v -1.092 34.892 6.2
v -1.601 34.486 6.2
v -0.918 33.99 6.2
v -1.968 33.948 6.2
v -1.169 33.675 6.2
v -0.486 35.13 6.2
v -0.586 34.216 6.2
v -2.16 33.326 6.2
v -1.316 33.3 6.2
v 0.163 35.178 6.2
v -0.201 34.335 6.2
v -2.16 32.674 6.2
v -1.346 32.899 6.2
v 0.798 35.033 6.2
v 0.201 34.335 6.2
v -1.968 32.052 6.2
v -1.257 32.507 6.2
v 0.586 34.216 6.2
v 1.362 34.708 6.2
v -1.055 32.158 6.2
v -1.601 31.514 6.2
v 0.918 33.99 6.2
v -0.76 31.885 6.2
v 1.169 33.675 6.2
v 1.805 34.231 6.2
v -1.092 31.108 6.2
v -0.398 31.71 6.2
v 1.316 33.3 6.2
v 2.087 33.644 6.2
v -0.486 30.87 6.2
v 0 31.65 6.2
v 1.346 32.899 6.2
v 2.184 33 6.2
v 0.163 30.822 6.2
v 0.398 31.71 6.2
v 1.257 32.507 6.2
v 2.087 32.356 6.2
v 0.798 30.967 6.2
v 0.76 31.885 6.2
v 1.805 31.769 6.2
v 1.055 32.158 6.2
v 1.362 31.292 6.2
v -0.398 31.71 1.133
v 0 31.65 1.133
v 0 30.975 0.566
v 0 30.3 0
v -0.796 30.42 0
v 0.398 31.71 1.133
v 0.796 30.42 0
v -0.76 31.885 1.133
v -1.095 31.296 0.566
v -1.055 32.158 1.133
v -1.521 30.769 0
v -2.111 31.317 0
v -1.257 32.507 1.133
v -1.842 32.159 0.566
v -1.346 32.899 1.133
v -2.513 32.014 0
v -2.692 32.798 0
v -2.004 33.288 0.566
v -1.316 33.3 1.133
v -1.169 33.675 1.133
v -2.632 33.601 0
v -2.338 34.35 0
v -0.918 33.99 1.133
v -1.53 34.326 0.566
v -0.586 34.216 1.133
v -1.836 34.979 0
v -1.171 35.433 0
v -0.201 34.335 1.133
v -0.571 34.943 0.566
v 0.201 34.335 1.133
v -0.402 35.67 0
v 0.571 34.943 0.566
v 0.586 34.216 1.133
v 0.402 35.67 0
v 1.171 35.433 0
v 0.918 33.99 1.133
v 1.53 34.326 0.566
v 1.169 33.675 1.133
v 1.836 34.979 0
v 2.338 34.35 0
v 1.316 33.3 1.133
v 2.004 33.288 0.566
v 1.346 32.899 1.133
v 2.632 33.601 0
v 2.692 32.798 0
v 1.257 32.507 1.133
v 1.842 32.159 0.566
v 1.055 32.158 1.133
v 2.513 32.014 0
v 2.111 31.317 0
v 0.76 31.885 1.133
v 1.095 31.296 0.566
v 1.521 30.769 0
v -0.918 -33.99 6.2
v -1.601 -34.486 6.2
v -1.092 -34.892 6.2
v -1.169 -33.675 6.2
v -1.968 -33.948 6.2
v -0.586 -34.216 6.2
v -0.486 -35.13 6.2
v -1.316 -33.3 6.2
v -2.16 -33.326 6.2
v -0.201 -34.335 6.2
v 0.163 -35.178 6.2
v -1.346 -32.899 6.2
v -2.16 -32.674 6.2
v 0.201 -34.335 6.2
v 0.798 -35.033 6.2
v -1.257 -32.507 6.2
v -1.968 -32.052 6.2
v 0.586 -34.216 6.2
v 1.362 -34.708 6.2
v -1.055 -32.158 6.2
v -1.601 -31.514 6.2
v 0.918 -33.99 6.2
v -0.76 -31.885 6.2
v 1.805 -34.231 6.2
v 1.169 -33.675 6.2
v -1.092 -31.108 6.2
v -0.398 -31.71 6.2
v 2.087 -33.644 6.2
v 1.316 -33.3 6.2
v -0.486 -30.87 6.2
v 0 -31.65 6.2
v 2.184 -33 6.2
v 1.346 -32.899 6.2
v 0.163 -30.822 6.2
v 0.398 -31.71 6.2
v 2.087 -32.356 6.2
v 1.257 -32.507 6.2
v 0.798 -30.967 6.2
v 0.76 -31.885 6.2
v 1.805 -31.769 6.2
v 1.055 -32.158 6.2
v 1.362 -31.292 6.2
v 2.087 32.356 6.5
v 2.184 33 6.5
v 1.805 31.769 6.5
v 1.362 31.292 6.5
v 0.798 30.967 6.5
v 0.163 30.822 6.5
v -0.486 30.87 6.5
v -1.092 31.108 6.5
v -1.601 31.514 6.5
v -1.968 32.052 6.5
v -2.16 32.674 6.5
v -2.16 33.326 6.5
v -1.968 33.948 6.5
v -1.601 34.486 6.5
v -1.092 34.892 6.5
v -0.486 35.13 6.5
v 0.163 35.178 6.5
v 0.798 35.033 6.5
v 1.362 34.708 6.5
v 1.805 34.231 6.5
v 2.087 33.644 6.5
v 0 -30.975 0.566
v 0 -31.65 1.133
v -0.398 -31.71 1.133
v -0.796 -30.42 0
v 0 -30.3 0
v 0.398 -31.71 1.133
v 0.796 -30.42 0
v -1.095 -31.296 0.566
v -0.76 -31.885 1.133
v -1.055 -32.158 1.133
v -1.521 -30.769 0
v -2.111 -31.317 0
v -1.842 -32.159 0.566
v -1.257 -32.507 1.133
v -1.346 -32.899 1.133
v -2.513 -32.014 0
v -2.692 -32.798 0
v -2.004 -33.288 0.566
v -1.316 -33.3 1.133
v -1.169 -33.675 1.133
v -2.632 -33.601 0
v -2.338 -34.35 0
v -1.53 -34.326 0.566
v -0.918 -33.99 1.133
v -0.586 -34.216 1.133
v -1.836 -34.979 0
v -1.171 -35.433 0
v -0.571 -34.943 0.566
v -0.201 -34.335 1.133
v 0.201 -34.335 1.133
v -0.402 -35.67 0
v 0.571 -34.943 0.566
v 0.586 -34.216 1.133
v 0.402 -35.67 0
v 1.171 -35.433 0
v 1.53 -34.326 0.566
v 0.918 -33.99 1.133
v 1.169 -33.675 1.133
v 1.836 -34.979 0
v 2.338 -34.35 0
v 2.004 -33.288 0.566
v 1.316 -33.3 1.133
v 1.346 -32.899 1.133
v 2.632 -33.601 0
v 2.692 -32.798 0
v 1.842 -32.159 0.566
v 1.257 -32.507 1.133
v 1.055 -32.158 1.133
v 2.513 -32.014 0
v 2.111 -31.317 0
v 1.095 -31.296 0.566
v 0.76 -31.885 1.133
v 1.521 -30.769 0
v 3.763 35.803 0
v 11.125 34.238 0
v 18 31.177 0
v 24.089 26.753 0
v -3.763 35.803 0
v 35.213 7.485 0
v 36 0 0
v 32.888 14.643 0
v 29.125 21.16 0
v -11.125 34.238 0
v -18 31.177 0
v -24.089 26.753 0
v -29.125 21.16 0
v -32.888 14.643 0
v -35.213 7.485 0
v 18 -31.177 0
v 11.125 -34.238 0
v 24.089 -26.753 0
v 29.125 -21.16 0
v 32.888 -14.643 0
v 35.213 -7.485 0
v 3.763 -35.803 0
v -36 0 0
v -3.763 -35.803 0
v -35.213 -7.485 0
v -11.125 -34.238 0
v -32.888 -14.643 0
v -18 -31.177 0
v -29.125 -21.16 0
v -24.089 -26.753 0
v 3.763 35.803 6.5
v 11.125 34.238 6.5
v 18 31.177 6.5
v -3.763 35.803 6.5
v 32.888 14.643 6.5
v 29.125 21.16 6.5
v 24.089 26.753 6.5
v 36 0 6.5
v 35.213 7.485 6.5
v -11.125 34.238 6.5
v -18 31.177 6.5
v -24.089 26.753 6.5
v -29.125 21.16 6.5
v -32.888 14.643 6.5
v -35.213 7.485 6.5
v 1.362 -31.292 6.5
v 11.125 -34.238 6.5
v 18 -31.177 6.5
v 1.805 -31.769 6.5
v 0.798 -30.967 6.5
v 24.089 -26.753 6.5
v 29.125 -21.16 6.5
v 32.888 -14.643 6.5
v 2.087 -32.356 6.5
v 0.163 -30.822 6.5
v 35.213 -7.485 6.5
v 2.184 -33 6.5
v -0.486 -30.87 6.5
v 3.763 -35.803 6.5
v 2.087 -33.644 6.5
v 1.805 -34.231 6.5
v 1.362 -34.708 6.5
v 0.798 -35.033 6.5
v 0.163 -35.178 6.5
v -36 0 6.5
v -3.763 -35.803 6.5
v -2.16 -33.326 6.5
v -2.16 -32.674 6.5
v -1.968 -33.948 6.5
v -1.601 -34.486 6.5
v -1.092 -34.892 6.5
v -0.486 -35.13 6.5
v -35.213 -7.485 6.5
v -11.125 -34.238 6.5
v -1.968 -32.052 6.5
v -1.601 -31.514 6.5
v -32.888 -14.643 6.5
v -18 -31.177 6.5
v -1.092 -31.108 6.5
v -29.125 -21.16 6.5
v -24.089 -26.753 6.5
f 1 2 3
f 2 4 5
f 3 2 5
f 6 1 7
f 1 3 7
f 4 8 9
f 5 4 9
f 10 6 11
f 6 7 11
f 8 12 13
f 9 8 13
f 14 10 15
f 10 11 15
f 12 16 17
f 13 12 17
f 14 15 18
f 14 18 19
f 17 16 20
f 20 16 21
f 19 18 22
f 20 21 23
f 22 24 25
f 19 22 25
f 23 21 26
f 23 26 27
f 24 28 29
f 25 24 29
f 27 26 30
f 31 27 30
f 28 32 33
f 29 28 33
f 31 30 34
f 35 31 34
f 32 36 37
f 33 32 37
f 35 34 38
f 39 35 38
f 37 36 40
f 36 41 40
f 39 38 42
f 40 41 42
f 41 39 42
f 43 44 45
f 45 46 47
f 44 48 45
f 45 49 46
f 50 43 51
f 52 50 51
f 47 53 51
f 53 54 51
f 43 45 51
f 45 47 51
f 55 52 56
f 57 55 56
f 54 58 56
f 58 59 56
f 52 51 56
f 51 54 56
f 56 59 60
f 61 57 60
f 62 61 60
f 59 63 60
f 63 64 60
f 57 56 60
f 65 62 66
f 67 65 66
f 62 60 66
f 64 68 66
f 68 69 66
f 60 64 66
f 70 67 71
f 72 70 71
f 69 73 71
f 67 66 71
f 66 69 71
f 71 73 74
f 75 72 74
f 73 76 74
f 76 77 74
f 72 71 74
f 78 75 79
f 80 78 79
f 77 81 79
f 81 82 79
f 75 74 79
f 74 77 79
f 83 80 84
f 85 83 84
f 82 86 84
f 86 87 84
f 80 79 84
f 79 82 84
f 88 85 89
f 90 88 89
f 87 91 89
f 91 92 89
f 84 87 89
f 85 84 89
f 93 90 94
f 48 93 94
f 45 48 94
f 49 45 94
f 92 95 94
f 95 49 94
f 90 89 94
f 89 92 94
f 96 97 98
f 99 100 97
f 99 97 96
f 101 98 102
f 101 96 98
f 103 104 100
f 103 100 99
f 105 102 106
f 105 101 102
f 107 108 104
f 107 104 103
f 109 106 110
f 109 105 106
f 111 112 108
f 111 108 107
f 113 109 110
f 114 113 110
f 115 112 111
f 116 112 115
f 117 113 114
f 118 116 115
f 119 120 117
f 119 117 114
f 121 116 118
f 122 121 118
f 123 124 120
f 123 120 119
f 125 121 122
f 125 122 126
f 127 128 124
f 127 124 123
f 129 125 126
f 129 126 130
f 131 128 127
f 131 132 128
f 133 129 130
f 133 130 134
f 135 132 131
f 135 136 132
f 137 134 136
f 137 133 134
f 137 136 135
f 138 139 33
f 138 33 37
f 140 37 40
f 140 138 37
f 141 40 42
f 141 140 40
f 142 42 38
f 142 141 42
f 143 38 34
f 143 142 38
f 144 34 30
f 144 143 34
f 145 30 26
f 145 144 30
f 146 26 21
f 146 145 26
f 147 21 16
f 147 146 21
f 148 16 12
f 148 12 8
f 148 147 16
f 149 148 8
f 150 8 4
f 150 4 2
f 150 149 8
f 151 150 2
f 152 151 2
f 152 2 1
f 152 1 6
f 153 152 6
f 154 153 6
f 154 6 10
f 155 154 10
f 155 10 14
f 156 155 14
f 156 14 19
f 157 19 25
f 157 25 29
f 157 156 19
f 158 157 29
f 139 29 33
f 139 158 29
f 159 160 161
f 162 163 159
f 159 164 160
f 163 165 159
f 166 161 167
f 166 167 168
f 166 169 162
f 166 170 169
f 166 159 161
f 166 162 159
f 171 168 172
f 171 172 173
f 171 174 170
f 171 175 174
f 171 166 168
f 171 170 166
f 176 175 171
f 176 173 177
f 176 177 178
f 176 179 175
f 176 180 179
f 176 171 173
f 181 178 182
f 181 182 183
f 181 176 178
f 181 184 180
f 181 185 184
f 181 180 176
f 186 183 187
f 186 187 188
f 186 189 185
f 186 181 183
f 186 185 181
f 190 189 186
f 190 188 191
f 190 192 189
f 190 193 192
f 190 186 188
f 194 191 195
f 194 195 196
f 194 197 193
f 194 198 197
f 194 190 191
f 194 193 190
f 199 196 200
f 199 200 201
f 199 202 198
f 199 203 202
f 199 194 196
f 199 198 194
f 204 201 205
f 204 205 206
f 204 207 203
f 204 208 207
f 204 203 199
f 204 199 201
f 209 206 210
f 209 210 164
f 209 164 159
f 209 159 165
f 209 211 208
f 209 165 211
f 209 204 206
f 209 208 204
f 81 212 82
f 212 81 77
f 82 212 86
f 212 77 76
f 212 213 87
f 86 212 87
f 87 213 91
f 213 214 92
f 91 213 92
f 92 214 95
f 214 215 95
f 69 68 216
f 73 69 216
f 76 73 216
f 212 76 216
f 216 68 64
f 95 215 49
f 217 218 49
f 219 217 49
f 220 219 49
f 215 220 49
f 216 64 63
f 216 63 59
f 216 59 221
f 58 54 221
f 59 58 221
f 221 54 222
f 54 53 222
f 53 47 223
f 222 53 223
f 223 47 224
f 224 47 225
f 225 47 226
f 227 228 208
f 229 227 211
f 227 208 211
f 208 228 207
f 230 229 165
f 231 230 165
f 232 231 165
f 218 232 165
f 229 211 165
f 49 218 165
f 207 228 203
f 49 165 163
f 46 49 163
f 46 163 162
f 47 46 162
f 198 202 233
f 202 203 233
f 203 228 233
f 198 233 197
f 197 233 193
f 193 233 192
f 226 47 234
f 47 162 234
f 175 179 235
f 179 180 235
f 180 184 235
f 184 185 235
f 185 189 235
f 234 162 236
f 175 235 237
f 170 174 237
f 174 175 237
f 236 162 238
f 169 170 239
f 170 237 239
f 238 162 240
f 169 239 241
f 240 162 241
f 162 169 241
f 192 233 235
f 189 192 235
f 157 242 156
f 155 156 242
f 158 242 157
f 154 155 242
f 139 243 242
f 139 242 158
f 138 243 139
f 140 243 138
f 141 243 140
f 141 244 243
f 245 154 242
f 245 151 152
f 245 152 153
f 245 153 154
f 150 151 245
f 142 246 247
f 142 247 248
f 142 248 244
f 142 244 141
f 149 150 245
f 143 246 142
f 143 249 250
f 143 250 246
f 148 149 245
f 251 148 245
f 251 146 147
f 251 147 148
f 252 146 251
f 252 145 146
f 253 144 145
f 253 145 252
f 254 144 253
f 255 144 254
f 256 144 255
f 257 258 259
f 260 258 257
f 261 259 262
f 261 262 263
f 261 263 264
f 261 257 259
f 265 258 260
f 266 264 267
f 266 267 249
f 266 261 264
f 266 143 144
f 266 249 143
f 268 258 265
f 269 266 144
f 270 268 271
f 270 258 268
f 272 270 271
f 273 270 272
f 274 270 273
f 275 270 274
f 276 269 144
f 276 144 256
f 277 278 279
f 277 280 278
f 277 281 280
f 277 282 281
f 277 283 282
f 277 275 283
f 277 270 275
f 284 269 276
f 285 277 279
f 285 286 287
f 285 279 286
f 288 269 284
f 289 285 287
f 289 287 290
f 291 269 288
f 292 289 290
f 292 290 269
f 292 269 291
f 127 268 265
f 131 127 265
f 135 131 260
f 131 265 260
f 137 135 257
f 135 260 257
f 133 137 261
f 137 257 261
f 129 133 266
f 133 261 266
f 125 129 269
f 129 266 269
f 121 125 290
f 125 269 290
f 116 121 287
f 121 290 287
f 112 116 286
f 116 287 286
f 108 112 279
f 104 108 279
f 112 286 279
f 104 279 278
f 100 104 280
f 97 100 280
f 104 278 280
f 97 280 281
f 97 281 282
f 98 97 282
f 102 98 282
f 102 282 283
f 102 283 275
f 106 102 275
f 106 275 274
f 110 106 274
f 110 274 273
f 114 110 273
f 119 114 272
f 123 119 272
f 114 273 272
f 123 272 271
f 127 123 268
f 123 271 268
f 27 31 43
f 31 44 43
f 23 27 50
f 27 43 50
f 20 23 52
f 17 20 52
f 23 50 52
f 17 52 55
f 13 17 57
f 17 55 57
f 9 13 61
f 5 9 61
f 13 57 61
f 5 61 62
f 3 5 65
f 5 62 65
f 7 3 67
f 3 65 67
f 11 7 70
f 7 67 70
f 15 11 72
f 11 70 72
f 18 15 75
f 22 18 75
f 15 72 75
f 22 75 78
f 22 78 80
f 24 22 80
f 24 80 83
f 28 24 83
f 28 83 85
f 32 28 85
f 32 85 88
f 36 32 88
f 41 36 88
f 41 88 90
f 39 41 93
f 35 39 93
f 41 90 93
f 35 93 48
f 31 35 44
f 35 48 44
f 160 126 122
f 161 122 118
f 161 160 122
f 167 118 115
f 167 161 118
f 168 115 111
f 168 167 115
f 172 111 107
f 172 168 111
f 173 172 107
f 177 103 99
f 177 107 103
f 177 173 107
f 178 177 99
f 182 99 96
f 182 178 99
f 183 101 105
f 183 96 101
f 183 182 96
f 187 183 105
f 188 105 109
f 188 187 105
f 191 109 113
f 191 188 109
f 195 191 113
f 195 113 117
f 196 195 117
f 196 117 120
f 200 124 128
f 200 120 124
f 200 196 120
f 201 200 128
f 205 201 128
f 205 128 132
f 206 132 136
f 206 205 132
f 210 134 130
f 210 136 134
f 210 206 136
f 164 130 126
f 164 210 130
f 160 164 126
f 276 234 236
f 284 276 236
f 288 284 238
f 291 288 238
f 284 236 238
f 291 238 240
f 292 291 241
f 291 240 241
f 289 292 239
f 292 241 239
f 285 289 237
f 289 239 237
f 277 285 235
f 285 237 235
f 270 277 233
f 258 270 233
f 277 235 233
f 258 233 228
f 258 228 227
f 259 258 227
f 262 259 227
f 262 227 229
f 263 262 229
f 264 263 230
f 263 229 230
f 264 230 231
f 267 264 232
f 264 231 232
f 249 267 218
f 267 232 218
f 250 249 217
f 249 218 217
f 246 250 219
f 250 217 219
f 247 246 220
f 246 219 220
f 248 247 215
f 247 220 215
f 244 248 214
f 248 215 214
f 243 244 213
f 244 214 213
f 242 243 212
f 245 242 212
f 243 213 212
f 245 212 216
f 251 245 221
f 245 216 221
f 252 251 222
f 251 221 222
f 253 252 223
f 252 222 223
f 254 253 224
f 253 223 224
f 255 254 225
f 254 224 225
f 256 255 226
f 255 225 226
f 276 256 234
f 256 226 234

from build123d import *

# Parameters (mm, degrees)
SKETCH1_R           = 36
BOSS_EXTRUDE1_DEPTH = 6.5
SKETCH11_R          = 2.1844
CUT_EXTRUDE3_DEPTH  = 0.3


with BuildPart() as part:
    # Sketch1 → Boss-Extrude1 (new body)
    with BuildSketch(Plane.XY):
        with Locations(Location((0, 0, 0), (0, 0, 180))):
            Circle(SKETCH1_R)
    extrude(amount=BOSS_EXTRUDE1_DEPTH)

    # Sketch10 → #4-40 Tapped Hole1 (revolve, cut)
    with BuildSketch(Plane(origin=(0, -33, 0), x_dir=(0, 1, 0), z_dir=(1, 0, 0))):
        Polygon((0, 0), (0, 7.311161816), (1.349999967, 6.5), (1.349999967, 1.132779999), (2.6999946, 0), align=None)
    f_4_40_tapped_hole1 = revolve(axis=Axis((0, -33, -6.35), (0, 0, 1)), mode=Mode.SUBTRACT)

    # Sketch11 → Cut-Extrude3 (cut)
    with BuildSketch(Plane.XY.offset(6.5)):
        with Locations((0, -33)):
            Circle(SKETCH11_R)
    cut_extrude3 = extrude(amount=-CUT_EXTRUDE3_DEPTH, mode=Mode.SUBTRACT)

    # Mirror1: #4-40 Tapped Hole1, Cut-Extrude3 across plane
    add(f_4_40_tapped_hole1.mirror(Plane(origin=(0, 0, 0), x_dir=(0, 0, 1), z_dir=(0, -1, 0))), mode=Mode.SUBTRACT)
    add(cut_extrude3.mirror(Plane(origin=(0, 0, 0), x_dir=(0, 0, 1), z_dir=(0, -1, 0))), mode=Mode.SUBTRACT)


solid = part.part
